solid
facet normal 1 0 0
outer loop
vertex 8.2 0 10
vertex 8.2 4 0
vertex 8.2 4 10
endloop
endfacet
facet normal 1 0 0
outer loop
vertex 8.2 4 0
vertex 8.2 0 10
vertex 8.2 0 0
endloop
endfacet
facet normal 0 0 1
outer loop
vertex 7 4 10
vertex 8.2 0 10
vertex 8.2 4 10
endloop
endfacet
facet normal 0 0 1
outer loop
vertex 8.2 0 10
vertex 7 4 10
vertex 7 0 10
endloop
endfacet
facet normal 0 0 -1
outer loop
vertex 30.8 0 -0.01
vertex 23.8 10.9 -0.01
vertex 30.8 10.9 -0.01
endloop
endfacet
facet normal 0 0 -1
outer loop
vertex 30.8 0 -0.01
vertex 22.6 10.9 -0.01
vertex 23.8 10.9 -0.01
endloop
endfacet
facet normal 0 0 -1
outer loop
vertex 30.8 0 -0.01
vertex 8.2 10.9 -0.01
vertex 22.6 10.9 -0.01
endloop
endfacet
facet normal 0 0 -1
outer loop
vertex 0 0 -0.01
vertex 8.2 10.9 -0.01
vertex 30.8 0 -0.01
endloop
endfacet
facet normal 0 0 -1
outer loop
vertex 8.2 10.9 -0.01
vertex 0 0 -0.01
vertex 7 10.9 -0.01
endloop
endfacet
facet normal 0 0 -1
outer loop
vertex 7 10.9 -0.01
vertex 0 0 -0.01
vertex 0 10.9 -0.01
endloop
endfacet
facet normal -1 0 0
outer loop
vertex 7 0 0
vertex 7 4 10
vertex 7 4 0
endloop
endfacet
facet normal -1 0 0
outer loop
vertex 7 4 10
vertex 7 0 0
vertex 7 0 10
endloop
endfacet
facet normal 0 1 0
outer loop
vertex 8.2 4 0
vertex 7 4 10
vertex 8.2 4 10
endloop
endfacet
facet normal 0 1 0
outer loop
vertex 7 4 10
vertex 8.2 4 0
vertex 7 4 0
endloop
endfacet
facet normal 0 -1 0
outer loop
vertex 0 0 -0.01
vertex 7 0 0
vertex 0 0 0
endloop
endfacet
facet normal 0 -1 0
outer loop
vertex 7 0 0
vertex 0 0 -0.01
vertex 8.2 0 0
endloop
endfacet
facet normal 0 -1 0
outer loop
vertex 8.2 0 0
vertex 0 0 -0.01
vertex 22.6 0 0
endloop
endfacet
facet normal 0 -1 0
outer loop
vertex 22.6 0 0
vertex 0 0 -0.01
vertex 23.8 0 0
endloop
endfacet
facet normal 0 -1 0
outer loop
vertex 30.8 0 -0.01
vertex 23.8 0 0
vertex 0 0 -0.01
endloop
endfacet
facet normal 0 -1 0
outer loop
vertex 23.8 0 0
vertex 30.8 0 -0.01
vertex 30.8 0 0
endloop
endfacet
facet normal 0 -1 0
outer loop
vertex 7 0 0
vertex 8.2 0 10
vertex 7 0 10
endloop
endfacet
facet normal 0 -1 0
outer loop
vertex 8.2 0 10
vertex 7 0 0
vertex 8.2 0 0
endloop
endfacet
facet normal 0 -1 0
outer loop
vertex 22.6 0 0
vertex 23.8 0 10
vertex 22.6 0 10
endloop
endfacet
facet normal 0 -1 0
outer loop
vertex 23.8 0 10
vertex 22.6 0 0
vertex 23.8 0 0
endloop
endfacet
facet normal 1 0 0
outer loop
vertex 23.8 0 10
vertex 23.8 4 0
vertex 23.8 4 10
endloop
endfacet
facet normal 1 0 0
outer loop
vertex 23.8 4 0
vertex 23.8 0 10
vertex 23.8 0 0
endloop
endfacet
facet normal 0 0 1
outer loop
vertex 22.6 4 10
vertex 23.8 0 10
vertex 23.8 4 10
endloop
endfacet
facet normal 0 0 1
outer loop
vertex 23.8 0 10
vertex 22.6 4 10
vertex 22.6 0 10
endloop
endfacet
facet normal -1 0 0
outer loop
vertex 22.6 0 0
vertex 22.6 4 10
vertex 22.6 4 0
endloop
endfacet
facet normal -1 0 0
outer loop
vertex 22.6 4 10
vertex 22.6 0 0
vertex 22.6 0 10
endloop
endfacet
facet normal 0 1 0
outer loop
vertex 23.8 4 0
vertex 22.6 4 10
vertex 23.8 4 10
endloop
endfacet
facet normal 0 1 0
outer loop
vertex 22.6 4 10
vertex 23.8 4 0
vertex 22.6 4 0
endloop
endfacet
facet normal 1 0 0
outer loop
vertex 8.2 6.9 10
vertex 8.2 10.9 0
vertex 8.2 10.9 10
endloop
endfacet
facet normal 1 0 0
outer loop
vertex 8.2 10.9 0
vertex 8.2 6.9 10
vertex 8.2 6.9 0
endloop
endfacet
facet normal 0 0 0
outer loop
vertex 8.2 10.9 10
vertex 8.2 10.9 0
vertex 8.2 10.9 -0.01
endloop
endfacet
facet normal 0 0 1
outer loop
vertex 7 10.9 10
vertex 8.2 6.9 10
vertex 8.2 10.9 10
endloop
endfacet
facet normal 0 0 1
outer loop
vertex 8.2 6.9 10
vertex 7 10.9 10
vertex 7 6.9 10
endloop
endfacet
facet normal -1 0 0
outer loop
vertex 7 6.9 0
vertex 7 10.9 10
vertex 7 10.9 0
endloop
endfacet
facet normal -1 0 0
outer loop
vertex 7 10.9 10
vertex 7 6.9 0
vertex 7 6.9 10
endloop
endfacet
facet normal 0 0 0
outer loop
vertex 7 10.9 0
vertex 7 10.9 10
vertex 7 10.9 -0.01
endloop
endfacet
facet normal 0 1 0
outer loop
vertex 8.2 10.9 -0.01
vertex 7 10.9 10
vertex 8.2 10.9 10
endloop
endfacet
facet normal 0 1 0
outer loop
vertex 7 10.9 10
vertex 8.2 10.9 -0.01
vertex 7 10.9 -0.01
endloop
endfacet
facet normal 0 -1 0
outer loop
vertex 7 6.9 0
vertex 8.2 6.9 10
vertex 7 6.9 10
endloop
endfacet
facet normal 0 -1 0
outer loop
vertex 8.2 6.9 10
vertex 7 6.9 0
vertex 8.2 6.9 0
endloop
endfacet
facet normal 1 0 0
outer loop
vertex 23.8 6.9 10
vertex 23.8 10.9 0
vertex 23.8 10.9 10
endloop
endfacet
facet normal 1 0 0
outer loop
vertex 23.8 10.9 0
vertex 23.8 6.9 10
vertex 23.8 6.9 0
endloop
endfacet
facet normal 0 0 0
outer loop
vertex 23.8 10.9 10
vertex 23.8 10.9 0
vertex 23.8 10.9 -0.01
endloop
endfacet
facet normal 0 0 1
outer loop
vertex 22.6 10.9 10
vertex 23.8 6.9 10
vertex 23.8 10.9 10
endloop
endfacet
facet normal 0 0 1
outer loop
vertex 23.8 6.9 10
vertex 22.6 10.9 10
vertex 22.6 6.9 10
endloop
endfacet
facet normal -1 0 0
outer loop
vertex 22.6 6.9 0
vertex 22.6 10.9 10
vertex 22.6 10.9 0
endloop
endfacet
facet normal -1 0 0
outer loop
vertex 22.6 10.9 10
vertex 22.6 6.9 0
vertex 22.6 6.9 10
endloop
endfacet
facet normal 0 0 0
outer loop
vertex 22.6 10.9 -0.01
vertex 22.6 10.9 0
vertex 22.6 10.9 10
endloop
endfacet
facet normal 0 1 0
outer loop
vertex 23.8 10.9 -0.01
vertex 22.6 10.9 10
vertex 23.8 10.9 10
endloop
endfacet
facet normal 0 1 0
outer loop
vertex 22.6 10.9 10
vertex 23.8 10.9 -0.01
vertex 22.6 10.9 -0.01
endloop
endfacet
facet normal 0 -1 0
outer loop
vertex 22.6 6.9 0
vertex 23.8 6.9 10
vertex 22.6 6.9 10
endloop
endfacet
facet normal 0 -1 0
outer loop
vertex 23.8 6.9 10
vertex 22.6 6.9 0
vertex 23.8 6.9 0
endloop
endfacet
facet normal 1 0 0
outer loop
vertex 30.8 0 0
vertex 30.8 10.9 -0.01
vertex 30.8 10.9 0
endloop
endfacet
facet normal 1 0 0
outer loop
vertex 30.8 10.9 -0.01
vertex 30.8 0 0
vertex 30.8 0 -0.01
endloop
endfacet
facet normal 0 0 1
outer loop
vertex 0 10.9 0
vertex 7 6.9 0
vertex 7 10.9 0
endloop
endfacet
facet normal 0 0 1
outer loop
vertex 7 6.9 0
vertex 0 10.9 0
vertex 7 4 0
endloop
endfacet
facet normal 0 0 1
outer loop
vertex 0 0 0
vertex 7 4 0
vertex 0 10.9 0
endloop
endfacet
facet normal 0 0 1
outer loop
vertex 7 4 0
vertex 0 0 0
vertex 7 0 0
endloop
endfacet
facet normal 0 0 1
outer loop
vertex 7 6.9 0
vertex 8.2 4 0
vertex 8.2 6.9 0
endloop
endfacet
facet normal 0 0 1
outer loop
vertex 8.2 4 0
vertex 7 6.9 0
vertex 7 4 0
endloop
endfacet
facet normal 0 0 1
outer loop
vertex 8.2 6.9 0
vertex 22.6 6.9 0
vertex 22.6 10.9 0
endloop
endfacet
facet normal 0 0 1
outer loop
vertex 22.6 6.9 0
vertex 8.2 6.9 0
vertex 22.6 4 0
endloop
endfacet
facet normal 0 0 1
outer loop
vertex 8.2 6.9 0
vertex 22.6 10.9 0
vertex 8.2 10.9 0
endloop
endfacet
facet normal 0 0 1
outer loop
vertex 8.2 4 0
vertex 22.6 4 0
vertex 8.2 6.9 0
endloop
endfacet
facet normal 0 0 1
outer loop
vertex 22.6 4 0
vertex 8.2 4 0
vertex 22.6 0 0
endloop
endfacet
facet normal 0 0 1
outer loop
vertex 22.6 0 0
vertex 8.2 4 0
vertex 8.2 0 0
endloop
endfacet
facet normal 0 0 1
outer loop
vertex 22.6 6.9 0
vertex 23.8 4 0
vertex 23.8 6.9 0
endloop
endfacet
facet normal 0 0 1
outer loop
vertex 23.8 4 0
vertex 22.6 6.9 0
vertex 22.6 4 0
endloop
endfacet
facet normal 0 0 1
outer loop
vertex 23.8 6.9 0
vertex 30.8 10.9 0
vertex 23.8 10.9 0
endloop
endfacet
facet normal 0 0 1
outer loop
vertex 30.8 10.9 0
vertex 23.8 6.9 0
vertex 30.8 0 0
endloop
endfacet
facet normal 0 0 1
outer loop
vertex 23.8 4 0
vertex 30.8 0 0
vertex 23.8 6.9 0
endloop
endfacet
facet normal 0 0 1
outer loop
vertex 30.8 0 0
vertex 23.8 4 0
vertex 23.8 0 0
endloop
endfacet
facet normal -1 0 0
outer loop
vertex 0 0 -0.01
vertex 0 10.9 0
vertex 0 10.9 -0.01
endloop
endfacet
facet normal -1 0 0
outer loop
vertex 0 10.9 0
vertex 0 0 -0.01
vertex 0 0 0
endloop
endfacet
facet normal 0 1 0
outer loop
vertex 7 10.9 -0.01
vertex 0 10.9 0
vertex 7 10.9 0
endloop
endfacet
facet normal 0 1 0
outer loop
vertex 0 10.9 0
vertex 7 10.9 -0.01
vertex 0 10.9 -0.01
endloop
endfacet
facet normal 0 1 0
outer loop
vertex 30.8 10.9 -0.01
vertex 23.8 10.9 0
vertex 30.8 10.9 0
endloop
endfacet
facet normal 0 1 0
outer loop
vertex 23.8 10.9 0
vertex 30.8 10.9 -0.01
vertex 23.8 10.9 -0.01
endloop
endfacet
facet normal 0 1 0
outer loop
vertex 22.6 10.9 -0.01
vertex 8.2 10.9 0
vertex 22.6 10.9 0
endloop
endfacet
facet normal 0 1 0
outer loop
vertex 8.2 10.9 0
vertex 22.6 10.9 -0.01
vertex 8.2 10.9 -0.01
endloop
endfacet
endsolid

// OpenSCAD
// file: ../Base/Boxes.scad
// Fischertechnik Box Foundation
// Pre-designed Boxes

use <Constants.scad>

include <PlacementOptions.scad>

box190Width = 190;
box190Depth = 130;
box130Width = 130;
box130Depth = 95;

// Values are from an original ec3 box
topBottomDifference = 1.5;
outerHeight = 40;
innerHeight = 38.2;
baseThickness = outerHeight - innerHeight;
stackExcess = 5.7;
radius = 3.5;
wallThickness = 1.5;
tolerance = 0.2;
stackOffset = innerHeight - stackExcess;

boxUsageHeight = stackOffset;
boxWallThickness = wallThickness;
boxBaseThickness = baseThickness;
boxWebWidth = 3.0;

// getBoxWallThickness()
// Gets the wall thickness of a Fischertechnik Box
function getBoxWallThickness() = boxWallThickness;

// getBoxUsageHeight()
// Gets the usable height of a Fischertechnik box
function getBoxUsageHeight() = boxUsageHeight;

// getBoxInnerHeight()
// Gets the inner height of a Fischertechnik box, including the stack excess
function getBoxInnerHeight() = innerHeight;

// getBoxBaseThickness()
// Gets the thickness of the Fischertechnik box base.
function getBoxBaseThickness() = boxBaseThickness;

// getBoxWebWidth()
// Gets the width of a box web
function getBoxWebWidth() = boxWebWidth;

// getBox190Space()
// Gets the usable inner space of a Box 190 as an x/y-list
function getBox190Space() = [
    box190Width - 2*getBoxWallThickness() - topBottomDifference, 
    box190Depth - 2*getBoxWallThickness() - topBottomDifference ];

// BoxBase(width, depth)
// Creates an empty stackable Fischertechnik compatible box
// width = Outer width of the box (190, 130, ...)
// depth = Outer depth of the box (130, 95, ...)

module BoxBase(width, depth, height=outerHeight) {    
    thinPlate = 0.01;

    innerHeight = height - baseThickness;    
    
    module BodyPlate(width, depth) {
        translate([radius, radius])
        hull() {
            w = width-2*radius;
            d = depth-2*radius;
            cube([w, d, thinPlate]);
            cylinder(thinPlate, r=radius, $fn=getFragments());
            translate([w, 0])
                cylinder(thinPlate, r=radius, $fn=getFragments());
            translate([w, d])
                cylinder(thinPlate, r=radius, $fn=getFragments());
            translate([0, d])
                cylinder(thinPlate, r=radius, $fn=getFragments());
        }
    }
    
    module Body(tolerance=tolerance) {
        hull() {
            // Bottom with tolerance to fit into the original boxes when stacked
            translate([-wallThickness+tolerance, -wallThickness+tolerance, -baseThickness])
                BodyPlate(width-topBottomDifference-2*tolerance, depth-topBottomDifference-2*tolerance);
            
            // Top
            translate([-wallThickness-topBottomDifference/2, -wallThickness-topBottomDifference/2, innerHeight-thinPlate])
                BodyPlate(width, depth);
         }
    }

    module Cutoff() {
        hull() {
            coWidth = width - 2*wallThickness;
            coDepth = depth - 2*wallThickness;
            
            // Bottom
            BodyPlate(coWidth-topBottomDifference, coDepth-topBottomDifference);

            // Top
            translate([-topBottomDifference/2, -topBottomDifference/2, innerHeight+thinPlate]) 
                BodyPlate(coWidth, coDepth);
        }
    }
    
    difference() {        
        Body();
        Cutoff();
        stackOffset = innerHeight - stackExcess;
        translate([0, 0, stackOffset + baseThickness])
            Body(tolerance=0);
    }
}

// Creates the Fischertechnik empty box 130x190 mm and places it at position 0,0
// 190x130 are the outer sizes, the inner space is slightly smaller. Use getBox190Space() to get the inner sizes.
// The box is positioned that the usable inner space is at the 0,0,0 position. The

module Box190() {
    BoxBase(box190Width, box190Depth);
}

// Gets the usable inner space of a Box 130 as an x/y-list
function getBox130Space() = [
    box130Width - 2*getBoxWallThickness() - topBottomDifference, 
    box130Depth - 2*getBoxWallThickness() - topBottomDifference ];

// Creates the Fischertechnik empty box 95x130 mm and places it at position 0,0
// 190x130 are the outer sizes, the inner space is slightly smaller. Use getBox190Space() to get the inner sizes.
// The box is positioned that the usable inner space is at the 0,0,0 position. The

module Box130() {
    BoxBase(box130Width, box130Depth);
}

// Creates a web at the specified box walls
// corner 0 = LowerLeft, 1 = UpperLeft, 2 = UpperRight, 3 = LowerRight
// side 0 = LeftOfCorner, 1 = RightOfCorner
// distance = Distance in mm from the corner
// boxSpace = inner width and depth of the box (default: Box 190)
// webWidth = length of the web (default is 3 mms)
// webThickness = thickness of the web (default is 1 mm)

module BoxWeb(corner, side, distance, boxSpace=getBox190Space(), webWidth=getBoxWebWidth(), webThickness=1.0) {
    sink = getBoxWallThickness()/2;

    width = (corner % 2 == 0) ? 
            (side == LeftOfCorner ? webWidth : webThickness) :
            (side == LeftOfCorner ? webThickness : webWidth);

    depth = (corner % 2 == 0) ? 
            (side == RightOfCorner ? webWidth : webThickness) :
            (side == RightOfCorner ? webThickness : webWidth);
    
    xDiff = corner == LowerLeft ? 
                (side == LeftOfCorner ? -sink : distance) :
            (corner == UpperLeft ?                
                (side == LeftOfCorner ? distance : -sink) :
            (corner == UpperRight ?
                (side == LeftOfCorner ? boxSpace.x-webWidth+sink : boxSpace.x-distance-webThickness) :
                (side == LeftOfCorner ? boxSpace.x-distance-webThickness: boxSpace.x-webWidth+sink)));

    yDiff = corner == LowerLeft ? 
                (side == RightOfCorner ? -sink : distance) :
            (corner == UpperLeft ?
                (side == RightOfCorner ? boxSpace.y-distance : boxSpace.y-webWidth+sink) :
            (corner == UpperRight ?
                (side == RightOfCorner ? boxSpace.y-webWidth+sink : boxSpace.y-distance) :
                (side == RightOfCorner ? distance : -sink)));
    
    translate([xDiff, yDiff, -getExcess()])
        cube([width, depth, boxUsageHeight + 2*getExcess()]);
}
// file: ../Base/Rotation.scad
// Fischertechnik Box Foundation
// Geometry Helpers Rotation

include <PlacementOptions.scad>

// getRotatedSpace(space, rotation=NoRotation)
// Rotates the space dependent on the specified rotation

function getRotatedSpace(space, rotation=NoRotation) = [
    (rotation == Rotate90 || rotation == Rotate270) ? space.y : space.x,
    (rotation == Rotate90 || rotation == Rotate270) ? space.x : space.y
];

// Rotates the given space around the fixed left lower corner
// space = the space the children needs as width/depth list [width,depth]
// rotation = 0 Rotate0 degrees, 1 Rotate90 degrees, 2 Rotate180 degrees, 3 Rotate270 degrees (equivalent to -90)

module RotateFix(space, rotation=NoRotation) {
    dy = (rotation == Rotate0 || rotation == Rotate270) ? 0 :
        (rotation == Rotate90) ? space.x :
        space.y;
    dx = (rotation < Rotate180) ? 0 :
        (rotation == Rotate180) ? space.x :
        space.y;
    
    translate([dx, dy, 0])
        rotate([0, 0, rotations[rotation]])
            children();
}
// file: ../Base/Alignment.scad
// Fischertechnik Box Foundation
// Geometry Helpers Alignment

include <PlacementOptions.scad>

// getAlignedX(elementWidth, spaceWidth, align=AlignRight, offset=0)
// Gets the aligned X offset of an element with the given
// width in the given space.
// elementWidth = The width of the element to positon
// spaceWidth = The space where the element should be aligned
// align = 0 AlignLeft, 1 AlignCenter, 2 AlignRight
// offset = an optional offset from the aligned position. When
// aligned left or centered, then positive values are in X direction.
// When aligned right then positive values are in negative X direction.

function getAlignedX(elementWidth, spaceWidth, align=AlignRight, offset=0) =
    (align == AlignLeft) ?
        offset :
        ((align == AlignCenter) ?
        (spaceWidth - elementWidth)/2 + offset :
        spaceWidth - offset - elementWidth);

// getAlignedY(elementDepth, spaceDepth, align=AlignTop, offset=0)
// Gets the aligned Y offset of an element with the given
// depth in the given space.
// elementDepth = The depth of the element to positon
// spaceDepth = The space where the element should be aligned
// align = 0 AlignBottom, 1 AlignCenter, 2 AlignTop
// offset = an optional offset from the aligned position. When
// aligned bottom or centered, then positive values are in Y direction.
// When aligned top then positive values are in negative Y direction.

function getAlignedY(elementDepth, spaceDepth, align=AlignTop, offset=0) =
    (align == AlignBottom) ?
        offset :
        ((align == AlignCenter) ?
        (spaceDepth - elementDepth)/2 + offset :
        spaceDepth - offset - elementDepth);
// file: ../Base/PlacementOptions.scad
// Fischertechnik Box Foundation
// Placement Options

// Alignment
NoAlign = 0;
AlignLeft = 1;
AlignBottom = 2;
AlignCenter = 3;
AlignRight = 4;
AlignTop = 5;

// Element rotation degree steps
rotations = [0, -90, -180, -270];

// Rotation
NoRotation = 0;
Rotate0 = 0;
Rotate90 = 1;
Rotate180 = 2;
Rotate270 = 3;

// Docking (seen from above)
NoDock = -1;
DockLeft = 0;
DockTop = 1;
DockRight = 2;
DockCorner = 2;
DockBottom = 3;

// Web corners
LowerLeft = 0;
UpperLeft = 1;
UpperRight = 2;
LowerRight = 3;

// Web position relative to corner
LeftOfCorner = 0;
RightOfCorner = 1;
// file: ../Base/Placement.scad
// Fischertechnik Box Foundation
// Geometry Helpers Placement

use <Constants.scad>
use <Alignment.scad>
use <Rotation.scad>
use <Boxes.scad>

include <PlacementOptions.scad>

// Place(x=0, y=0, elementSpace=[0,0], alignX=AlignLeft, alignY=AlignBottom, rotation=Rotate0, boxSpace=getBox190Space())
// Places the child at the specified position
// y = Y-Position. This is a relative position when an X aligment is specified.
// x = X-Position. This is a relative position when an Y aligment is specified.
// elementSpace = space of the element to be placed [x,y]
// alignX = -1=NoAlign, 0 AlignLeft, 1 AlignCenter, 3 AlignRight (elementSpace and boxSpace required!)
// alignY = -1=NoAlign, 2 AlignBottom, 1 AlignCenter, 4 AlignTop (elementSpace and boxSpace required!)
// rotation = 0 Rotate0 0 degrees, 1 Rotate90 90 degrees, 
// 2 Rotate180 180 degrees, 3 Rotate270 270 degrees (equivalent to -90)
// boxSpace = Inner space of the box where the placement occurs [x,y] - default is Box 190x130 inner space

module Place(x=0, y=0, elementSpace=[0,0], 
  alignX=AlignLeft, alignY=AlignBottom, 
  rotation=NoRotation, boxSpace=getBox190Space()) {

    module Position(x, y, space, rotation=Rotate0) {
        translate([x, y, 0])
            RotateFix(space, rotation)
                children();
    }

    space = getRotatedSpace(elementSpace, rotation);
    alignedX = getAlignedX(space.x, boxSpace.x, alignX, x);
    alignedY = getAlignedY(space.y, boxSpace.y, alignY, y);
    Position(alignedX, alignedY, elementSpace, rotation)
        children();
}

// Center(space=getBox130Space(), elementSpace=[0,0])
// space = Space where the children is centered. For cylinder use centered=true and no elementSpace.
// elementSpace = space of the element to be centered [x,y]

module Center(space=getBox190Space(), elementSpace=[0,0]) {
    Place(elementSpace=elementSpace, boxSpace=space, alignX=AlignCenter, alignY=AlignCenter)
        children();
}

// CenterHorizontal(width=0, y=0, offset=0, space=getBox130Space())
// width = Width of the element to be placed.
// y = Y position of the element
// offset = Offset from the center position (negative will be left of the center)
// space = Space where the element is placed

module CenterHorizontal(width=0, y=0, offset=0, space=getBox190Space()) {
    Place(x=offset, y=y, elementSpace=[width, 0], boxSpace=space, alignX=AlignCenter)
        children(0);
}

// CenterVertical(depth=0, x=0, offset=0, space=getBox130Space())
// depth = Depth of the element to be placed.
// x = X position of the element
// offset = Offset from the center position (negative will be down of the center)
// space = Space where the element is placed

module CenterVertical(depth=0, x=0, offset=0, space=getBox190Space()) {
    Place(x=x, y=offset, elementSpace=[0, depth], boxSpace=space, alignY=AlignCenter)
        children(0);
}

// getIsVertical(align)
// True if the specified alignment needs a vertical orientation for a divider (AlignRight, AlignLeft)

function getIsVertical(align) = (align == AlignRight || align == AlignLeft);

// getIsHorizontal(align)
// True if the specified alignment needs a horizontal orientation for a divider (AlignTop, AlignBottom)

function getIsHorizontal(align) = (align == AlignTop || align == AlignBottom);
// file: ../Base/Constants.scad
// Fischertechnik Box Foundation
// Constants

// Constant values necessary for multiple elements

// Base constants
dividerThickness = 1.2;
excess = 0.01;
fragments = 90;
tolerance = 0.8;

// Gets the thickness of a divider 
function getDividerThickness() = dividerThickness;

// Gets the excess that is used to merge walls into each other
function getExcess() = excess;

// Gets amount of fragments of a cylinder
function getFragments() = fragments;

// Gets the inner tolerance of a frame to each side
function getTolerance() = tolerance;


// Fischertechnik specific constants
axisDiameter = 4;
axisBottomDiameter = axisDiameter + 1;
standardEdgeDistance = 2.5;
standardWebDistance = 11.5;
standardCornerLength = 15;
tubeWallFactor = 0.8;
smallPartsFrameHeight = 20;

// Gets axis diameter
function getAxisDiameter() = axisDiameter;

// Gets axis bottom diameter for thicker part at the bottom
function getAxisBottomDiameter() = axisBottomDiameter;

// gets the standard distance to the wall of the box for dockable frames with webs
function getStandardEdgeDistance() = standardEdgeDistance;

// gets the standard distance of each web to the corner of the dockable frame
function getStandardWebDistance() = standardWebDistance;

// gets the standard length of the corner walls of a dockable frame
function getStandardCornerLength() = standardCornerLength;

// gets the wall thickness of a tube.
function getTubeWallThickness() = tubeWallFactor * getDividerThickness();

// gets the frame height for docked small parts boxes.
function getSmallPartsFrameHeight() = smallPartsFrameHeight;
// main file
// Fischertechnik Box Library
// Holder for Building Plate 30x30
// 38259, 38266, 38259, 146534

use <../ModelBase/Complex.scad>

/* [Element Parameters] */
count = 1;
dock = false;

/* [Hidden] */
width = 30;

// getHolderBuildingPlate30x30Space(count = 1)
// Gets the width (.x) and depth (.y) space the holder needs.

function getHolderBuildingPlate30x30Space(count = 1) = getHolderBuildingPlateSpace(width, count);

// HolderBuildingPlate30x30(count=1, dock=false)
// Holder for building plates 30x30
// count = Count of building plates (default 1)
// dock = true if the holders are docked to the box wall (default false) 

module HolderBuildingPlate30x30(count = 1, dock = false) {
    HolderBuildingPlate(width, count, dock);
}

// Test
color("lightgray")
HolderBuildingPlate30x30(count, dock);
